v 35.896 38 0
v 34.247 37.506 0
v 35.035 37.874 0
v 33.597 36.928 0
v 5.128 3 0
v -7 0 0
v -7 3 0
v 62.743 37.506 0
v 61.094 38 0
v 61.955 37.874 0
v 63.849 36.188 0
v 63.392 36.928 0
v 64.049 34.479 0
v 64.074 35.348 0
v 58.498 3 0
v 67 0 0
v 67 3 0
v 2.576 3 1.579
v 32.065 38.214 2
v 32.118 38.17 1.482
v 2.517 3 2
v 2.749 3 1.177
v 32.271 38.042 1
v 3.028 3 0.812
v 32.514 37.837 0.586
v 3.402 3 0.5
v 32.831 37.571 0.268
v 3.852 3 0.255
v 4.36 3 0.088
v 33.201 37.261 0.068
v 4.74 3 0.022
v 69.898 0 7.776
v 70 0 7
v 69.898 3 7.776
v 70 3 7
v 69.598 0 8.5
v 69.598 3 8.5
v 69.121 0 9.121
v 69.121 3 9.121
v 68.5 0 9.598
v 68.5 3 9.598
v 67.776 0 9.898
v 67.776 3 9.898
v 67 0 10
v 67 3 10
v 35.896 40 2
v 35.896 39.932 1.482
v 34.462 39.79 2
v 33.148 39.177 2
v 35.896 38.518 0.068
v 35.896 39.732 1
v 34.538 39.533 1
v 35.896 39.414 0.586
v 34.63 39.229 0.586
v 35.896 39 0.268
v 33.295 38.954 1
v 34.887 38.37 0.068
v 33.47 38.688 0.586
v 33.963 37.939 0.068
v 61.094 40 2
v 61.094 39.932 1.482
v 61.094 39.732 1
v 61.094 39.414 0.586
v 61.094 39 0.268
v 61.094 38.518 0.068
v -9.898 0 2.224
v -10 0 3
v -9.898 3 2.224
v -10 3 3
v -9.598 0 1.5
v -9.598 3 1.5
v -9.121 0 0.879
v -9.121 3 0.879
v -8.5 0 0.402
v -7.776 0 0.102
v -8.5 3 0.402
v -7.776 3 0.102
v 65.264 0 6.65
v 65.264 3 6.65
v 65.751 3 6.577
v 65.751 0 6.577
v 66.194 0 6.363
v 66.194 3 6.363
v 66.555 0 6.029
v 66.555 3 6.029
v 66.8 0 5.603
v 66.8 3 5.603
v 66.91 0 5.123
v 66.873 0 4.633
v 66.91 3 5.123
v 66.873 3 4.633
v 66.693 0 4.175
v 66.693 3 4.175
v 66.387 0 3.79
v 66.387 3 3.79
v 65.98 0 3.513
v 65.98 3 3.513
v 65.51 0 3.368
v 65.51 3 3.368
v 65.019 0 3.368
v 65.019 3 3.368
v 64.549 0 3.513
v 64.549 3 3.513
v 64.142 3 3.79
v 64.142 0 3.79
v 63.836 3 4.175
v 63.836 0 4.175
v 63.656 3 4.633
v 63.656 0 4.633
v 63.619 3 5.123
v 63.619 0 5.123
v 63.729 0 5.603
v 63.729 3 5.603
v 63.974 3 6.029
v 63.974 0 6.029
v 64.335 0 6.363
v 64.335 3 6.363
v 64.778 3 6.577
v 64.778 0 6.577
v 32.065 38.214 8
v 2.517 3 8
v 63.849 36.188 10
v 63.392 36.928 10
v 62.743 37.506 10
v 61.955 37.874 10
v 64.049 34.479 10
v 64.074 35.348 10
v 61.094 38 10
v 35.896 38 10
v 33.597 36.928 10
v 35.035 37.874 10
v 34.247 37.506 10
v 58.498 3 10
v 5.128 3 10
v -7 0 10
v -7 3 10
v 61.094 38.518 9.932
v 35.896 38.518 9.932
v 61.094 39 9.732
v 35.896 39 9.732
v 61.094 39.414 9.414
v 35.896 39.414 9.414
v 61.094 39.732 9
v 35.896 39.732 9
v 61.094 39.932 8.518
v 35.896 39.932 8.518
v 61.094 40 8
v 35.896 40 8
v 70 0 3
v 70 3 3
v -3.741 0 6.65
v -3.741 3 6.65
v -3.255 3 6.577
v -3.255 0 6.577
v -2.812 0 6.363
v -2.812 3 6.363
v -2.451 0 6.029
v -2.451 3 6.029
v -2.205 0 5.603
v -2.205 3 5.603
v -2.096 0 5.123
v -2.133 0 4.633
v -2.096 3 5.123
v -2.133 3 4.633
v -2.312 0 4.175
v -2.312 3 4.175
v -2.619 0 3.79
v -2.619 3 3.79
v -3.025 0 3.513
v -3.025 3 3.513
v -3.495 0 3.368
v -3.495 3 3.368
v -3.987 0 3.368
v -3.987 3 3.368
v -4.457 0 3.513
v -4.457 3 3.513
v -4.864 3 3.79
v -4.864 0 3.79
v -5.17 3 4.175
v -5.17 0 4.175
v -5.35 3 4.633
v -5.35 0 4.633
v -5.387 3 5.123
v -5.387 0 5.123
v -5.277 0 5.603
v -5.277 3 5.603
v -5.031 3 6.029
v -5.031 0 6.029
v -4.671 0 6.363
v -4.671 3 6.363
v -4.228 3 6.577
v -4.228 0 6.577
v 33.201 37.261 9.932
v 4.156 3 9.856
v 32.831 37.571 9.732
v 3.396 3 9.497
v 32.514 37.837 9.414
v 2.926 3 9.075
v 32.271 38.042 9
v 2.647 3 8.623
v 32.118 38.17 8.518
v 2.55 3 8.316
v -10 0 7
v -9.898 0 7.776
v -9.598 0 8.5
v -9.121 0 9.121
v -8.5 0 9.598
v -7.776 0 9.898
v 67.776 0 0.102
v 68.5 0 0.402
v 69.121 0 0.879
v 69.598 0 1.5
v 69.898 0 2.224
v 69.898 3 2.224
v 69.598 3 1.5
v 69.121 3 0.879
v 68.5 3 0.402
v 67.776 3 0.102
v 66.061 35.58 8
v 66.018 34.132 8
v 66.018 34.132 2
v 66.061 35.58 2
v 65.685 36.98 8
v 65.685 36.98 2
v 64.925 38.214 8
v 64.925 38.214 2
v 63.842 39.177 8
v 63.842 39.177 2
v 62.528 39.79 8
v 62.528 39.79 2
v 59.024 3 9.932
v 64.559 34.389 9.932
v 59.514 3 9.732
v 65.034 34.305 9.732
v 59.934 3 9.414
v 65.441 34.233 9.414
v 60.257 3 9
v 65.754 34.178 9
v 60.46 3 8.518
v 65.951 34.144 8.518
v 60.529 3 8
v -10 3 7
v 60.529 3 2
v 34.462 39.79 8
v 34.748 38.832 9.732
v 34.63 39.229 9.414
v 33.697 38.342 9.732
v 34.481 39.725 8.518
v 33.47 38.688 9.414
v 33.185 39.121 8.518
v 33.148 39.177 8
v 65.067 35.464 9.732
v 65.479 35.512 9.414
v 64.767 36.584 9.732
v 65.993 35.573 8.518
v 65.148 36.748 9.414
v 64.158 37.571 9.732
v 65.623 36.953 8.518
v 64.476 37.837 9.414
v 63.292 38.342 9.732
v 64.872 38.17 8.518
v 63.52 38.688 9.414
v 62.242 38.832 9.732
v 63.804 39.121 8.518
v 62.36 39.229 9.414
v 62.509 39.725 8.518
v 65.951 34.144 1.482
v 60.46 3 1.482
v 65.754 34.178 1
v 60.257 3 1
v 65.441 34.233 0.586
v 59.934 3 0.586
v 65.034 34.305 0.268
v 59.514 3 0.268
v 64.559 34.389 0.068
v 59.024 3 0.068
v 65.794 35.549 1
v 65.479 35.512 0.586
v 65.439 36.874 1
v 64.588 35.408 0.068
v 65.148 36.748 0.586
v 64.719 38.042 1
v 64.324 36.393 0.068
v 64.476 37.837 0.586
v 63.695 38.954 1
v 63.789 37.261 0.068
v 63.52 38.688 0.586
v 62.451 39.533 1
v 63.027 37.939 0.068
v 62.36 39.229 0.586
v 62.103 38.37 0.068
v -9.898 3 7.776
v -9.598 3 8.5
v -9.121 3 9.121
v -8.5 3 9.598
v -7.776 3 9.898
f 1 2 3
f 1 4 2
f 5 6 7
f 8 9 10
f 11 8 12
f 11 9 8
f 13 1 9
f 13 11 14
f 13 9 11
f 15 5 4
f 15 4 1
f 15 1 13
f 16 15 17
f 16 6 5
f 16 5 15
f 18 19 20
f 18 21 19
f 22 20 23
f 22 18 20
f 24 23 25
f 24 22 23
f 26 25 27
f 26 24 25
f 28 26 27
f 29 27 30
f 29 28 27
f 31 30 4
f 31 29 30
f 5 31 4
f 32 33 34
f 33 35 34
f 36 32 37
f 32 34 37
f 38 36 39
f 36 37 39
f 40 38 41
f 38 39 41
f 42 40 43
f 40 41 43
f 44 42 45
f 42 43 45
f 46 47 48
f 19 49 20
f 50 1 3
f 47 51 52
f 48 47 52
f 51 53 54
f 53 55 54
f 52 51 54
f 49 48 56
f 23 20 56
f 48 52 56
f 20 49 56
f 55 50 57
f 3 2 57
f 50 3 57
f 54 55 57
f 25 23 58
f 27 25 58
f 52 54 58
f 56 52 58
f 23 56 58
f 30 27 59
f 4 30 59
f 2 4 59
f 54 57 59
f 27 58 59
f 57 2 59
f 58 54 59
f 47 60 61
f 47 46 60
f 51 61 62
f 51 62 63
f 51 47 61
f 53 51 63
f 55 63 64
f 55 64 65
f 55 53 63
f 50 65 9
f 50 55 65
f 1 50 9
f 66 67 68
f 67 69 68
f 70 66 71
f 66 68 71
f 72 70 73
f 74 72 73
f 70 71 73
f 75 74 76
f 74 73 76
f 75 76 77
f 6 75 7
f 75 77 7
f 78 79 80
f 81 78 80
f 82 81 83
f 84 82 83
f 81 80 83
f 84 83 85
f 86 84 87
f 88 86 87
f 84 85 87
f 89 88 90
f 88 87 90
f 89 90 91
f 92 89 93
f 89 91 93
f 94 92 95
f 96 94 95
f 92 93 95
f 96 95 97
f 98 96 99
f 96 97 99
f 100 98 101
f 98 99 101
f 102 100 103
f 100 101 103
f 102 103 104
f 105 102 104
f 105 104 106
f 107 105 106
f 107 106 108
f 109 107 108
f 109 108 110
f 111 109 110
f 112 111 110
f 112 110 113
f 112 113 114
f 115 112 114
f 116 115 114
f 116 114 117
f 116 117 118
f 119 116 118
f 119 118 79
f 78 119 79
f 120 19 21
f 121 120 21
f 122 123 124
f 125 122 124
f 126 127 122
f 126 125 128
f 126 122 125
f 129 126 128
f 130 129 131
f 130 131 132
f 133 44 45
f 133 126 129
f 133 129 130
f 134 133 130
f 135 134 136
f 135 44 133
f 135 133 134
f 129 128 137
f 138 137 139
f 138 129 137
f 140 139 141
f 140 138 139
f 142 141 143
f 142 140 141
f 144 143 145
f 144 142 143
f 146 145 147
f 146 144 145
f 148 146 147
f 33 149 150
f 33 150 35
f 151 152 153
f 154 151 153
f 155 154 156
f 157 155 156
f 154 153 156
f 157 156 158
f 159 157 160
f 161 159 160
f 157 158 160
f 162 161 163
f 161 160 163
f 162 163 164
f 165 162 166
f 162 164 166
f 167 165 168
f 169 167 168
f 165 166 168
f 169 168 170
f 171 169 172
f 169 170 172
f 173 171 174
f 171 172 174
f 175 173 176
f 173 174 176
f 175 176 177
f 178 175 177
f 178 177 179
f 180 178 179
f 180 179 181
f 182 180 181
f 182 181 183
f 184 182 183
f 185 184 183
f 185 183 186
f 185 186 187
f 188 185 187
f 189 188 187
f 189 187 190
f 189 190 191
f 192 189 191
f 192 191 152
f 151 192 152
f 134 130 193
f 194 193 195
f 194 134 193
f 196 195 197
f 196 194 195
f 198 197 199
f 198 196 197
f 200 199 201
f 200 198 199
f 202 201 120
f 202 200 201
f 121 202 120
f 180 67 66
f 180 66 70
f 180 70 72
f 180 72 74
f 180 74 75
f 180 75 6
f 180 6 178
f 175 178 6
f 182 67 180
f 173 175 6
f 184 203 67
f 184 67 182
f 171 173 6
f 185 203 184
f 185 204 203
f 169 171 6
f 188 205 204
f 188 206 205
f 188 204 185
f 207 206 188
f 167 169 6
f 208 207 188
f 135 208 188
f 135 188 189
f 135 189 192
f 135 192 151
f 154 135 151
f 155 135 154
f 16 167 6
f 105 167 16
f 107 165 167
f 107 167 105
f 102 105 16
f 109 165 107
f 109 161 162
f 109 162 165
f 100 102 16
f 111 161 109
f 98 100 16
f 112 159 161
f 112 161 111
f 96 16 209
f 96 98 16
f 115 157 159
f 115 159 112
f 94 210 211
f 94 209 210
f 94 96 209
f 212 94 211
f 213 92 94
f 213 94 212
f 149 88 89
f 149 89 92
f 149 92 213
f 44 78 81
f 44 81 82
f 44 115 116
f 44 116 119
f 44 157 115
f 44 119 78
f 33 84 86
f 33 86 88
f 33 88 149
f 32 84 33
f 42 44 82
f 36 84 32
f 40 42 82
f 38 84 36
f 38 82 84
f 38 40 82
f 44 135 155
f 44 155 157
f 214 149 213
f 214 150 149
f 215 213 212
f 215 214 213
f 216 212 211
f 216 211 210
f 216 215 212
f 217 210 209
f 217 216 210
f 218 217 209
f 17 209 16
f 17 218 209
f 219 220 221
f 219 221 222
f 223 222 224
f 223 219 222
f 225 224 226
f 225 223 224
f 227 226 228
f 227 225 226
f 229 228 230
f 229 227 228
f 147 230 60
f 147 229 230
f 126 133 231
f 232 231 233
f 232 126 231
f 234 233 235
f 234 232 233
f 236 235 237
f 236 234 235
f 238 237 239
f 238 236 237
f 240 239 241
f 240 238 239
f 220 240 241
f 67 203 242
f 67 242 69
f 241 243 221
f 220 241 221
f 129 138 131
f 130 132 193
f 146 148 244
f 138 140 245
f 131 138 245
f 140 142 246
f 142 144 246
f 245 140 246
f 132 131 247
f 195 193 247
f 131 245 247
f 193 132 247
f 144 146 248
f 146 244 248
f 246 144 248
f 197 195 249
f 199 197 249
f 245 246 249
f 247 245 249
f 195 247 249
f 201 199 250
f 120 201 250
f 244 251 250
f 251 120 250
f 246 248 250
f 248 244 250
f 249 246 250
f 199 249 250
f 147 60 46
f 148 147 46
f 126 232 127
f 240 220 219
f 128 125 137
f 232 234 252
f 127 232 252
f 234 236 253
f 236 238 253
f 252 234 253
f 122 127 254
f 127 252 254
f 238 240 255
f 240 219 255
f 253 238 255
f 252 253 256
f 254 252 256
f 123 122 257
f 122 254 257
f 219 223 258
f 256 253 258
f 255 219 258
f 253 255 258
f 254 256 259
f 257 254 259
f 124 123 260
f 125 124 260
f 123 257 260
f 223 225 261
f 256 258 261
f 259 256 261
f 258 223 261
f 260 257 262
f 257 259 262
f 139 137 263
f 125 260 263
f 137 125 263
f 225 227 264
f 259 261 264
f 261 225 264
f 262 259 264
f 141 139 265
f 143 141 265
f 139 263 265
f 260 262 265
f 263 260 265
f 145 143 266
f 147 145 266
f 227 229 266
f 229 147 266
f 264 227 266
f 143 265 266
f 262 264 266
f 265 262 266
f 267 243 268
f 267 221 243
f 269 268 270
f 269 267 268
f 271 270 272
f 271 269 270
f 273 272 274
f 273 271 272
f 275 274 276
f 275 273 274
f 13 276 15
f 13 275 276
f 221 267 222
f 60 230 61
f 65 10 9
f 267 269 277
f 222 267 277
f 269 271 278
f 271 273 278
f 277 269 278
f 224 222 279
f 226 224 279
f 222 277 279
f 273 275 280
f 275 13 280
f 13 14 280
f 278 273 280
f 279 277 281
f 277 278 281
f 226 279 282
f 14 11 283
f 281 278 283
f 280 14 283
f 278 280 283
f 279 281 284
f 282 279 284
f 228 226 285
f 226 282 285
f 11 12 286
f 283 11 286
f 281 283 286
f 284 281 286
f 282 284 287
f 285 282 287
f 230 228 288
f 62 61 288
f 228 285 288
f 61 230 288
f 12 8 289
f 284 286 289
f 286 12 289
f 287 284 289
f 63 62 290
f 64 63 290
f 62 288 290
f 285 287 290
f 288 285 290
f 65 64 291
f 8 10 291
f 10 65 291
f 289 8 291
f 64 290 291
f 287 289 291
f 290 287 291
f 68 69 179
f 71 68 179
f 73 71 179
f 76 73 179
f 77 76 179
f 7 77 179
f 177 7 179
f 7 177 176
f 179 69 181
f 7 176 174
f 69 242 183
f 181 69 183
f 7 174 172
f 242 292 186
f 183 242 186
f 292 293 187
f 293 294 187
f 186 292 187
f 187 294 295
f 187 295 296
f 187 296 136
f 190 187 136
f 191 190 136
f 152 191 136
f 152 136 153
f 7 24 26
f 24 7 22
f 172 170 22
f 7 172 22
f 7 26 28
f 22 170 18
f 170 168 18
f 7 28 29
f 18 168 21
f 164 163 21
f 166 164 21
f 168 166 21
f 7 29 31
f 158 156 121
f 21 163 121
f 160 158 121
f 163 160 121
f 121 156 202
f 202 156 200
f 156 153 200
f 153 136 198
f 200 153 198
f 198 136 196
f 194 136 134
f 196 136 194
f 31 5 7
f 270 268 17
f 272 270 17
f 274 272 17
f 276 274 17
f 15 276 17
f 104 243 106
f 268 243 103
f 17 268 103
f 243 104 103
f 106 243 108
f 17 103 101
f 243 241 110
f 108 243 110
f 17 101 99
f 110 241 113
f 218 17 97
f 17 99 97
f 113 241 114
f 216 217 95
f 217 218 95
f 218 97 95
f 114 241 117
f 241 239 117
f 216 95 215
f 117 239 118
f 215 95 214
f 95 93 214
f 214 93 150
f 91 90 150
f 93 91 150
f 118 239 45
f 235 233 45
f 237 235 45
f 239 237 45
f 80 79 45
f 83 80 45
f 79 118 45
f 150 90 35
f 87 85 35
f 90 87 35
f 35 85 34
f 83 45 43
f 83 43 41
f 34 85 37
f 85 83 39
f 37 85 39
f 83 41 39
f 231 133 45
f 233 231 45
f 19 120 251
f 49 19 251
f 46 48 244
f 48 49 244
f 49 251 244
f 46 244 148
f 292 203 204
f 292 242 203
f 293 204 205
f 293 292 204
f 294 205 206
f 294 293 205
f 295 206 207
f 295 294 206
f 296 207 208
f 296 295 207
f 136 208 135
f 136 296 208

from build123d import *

# Parameters (mm, degrees)
BOSS_EXTRUDE1_DEPTH = 10
BOSS_EXTRUDE2_DEPTH = 3
FILLET2_R           = 3
SKETCH3_R           = 1.65
CUT_EXTRUDE2_DEPTH  = 80.806014811
FILLET4_R           = 5
FILLET3_R           = 2


with BuildPart() as part:
    # Sketch1 → Boss-Extrude1 (new body)
    with BuildSketch(Plane.XY):
        Polygon((0, 0), (60, 0), (67.053079228, 40), (33.563985247, 40), align=None)
    extrude(amount=BOSS_EXTRUDE1_DEPTH)

    # Sketch2 → Boss-Extrude2 (add)
    with BuildSketch(Plane.XZ):
        Polygon((0, 10), (-10, 10), (-10, 0), (0, 0), (70, 0), (70, 10), (60, 10), align=None)
    extrude(amount=-BOSS_EXTRUDE2_DEPTH)

    # Fillet2
    fillet2_edges = [part.edges().sort_by_distance(p)[0] for p in [
        (70, 1.5, 0),
        (-10, 1.5, 10),
        (70, 1.5, 10),
        (-10, 1.5, 0),
    ]]
    fillet(fillet2_edges, radius=FILLET2_R)

    # Sketch3 → Cut-Extrude2 (cut, through all)
    with BuildSketch(Plane(origin=(0, 3, 0), x_dir=(1, 0, 0), z_dir=(0, 1, 0))):
        with Locations(Location((65.264490471, -5, 0), (0, 0, 270))):
            Circle(SKETCH3_R)
        with Locations(Location((-3.741350553, -5, 0), (0, 0, 270))):
            Circle(SKETCH3_R)
    extrude(amount=-CUT_EXTRUDE2_DEPTH, mode=Mode.SUBTRACT)

    # Fillet4
    fillet4_edges = [part.edges().sort_by_distance(p)[0] for p in [
        (67.053079228, 40, 5),
        (33.563985247, 40, 5),
    ]]
    fillet(fillet4_edges, radius=FILLET4_R)

    # Fillet3
    fillet3_edges = [part.edges().sort_by_distance(p)[0] for p in [
        (63.273665486, 18.565879556, 0),
        (17.291300108, 20.606969024, 0),
        (17.291300108, 20.606969024, 10),
        (63.273665486, 18.565879556, 10),
        (48.494917402, 40, 0),
        (48.494917402, 40, 10),
        (33.782432229, 39.531538935, 0),
        (64.924533481, 38.213938048, 0),
        (33.782432229, 39.531538935, 10),
        (64.924533481, 38.213938048, 10),
    ]]
    fillet(fillet3_edges, radius=FILLET3_R)


solid = part.part
